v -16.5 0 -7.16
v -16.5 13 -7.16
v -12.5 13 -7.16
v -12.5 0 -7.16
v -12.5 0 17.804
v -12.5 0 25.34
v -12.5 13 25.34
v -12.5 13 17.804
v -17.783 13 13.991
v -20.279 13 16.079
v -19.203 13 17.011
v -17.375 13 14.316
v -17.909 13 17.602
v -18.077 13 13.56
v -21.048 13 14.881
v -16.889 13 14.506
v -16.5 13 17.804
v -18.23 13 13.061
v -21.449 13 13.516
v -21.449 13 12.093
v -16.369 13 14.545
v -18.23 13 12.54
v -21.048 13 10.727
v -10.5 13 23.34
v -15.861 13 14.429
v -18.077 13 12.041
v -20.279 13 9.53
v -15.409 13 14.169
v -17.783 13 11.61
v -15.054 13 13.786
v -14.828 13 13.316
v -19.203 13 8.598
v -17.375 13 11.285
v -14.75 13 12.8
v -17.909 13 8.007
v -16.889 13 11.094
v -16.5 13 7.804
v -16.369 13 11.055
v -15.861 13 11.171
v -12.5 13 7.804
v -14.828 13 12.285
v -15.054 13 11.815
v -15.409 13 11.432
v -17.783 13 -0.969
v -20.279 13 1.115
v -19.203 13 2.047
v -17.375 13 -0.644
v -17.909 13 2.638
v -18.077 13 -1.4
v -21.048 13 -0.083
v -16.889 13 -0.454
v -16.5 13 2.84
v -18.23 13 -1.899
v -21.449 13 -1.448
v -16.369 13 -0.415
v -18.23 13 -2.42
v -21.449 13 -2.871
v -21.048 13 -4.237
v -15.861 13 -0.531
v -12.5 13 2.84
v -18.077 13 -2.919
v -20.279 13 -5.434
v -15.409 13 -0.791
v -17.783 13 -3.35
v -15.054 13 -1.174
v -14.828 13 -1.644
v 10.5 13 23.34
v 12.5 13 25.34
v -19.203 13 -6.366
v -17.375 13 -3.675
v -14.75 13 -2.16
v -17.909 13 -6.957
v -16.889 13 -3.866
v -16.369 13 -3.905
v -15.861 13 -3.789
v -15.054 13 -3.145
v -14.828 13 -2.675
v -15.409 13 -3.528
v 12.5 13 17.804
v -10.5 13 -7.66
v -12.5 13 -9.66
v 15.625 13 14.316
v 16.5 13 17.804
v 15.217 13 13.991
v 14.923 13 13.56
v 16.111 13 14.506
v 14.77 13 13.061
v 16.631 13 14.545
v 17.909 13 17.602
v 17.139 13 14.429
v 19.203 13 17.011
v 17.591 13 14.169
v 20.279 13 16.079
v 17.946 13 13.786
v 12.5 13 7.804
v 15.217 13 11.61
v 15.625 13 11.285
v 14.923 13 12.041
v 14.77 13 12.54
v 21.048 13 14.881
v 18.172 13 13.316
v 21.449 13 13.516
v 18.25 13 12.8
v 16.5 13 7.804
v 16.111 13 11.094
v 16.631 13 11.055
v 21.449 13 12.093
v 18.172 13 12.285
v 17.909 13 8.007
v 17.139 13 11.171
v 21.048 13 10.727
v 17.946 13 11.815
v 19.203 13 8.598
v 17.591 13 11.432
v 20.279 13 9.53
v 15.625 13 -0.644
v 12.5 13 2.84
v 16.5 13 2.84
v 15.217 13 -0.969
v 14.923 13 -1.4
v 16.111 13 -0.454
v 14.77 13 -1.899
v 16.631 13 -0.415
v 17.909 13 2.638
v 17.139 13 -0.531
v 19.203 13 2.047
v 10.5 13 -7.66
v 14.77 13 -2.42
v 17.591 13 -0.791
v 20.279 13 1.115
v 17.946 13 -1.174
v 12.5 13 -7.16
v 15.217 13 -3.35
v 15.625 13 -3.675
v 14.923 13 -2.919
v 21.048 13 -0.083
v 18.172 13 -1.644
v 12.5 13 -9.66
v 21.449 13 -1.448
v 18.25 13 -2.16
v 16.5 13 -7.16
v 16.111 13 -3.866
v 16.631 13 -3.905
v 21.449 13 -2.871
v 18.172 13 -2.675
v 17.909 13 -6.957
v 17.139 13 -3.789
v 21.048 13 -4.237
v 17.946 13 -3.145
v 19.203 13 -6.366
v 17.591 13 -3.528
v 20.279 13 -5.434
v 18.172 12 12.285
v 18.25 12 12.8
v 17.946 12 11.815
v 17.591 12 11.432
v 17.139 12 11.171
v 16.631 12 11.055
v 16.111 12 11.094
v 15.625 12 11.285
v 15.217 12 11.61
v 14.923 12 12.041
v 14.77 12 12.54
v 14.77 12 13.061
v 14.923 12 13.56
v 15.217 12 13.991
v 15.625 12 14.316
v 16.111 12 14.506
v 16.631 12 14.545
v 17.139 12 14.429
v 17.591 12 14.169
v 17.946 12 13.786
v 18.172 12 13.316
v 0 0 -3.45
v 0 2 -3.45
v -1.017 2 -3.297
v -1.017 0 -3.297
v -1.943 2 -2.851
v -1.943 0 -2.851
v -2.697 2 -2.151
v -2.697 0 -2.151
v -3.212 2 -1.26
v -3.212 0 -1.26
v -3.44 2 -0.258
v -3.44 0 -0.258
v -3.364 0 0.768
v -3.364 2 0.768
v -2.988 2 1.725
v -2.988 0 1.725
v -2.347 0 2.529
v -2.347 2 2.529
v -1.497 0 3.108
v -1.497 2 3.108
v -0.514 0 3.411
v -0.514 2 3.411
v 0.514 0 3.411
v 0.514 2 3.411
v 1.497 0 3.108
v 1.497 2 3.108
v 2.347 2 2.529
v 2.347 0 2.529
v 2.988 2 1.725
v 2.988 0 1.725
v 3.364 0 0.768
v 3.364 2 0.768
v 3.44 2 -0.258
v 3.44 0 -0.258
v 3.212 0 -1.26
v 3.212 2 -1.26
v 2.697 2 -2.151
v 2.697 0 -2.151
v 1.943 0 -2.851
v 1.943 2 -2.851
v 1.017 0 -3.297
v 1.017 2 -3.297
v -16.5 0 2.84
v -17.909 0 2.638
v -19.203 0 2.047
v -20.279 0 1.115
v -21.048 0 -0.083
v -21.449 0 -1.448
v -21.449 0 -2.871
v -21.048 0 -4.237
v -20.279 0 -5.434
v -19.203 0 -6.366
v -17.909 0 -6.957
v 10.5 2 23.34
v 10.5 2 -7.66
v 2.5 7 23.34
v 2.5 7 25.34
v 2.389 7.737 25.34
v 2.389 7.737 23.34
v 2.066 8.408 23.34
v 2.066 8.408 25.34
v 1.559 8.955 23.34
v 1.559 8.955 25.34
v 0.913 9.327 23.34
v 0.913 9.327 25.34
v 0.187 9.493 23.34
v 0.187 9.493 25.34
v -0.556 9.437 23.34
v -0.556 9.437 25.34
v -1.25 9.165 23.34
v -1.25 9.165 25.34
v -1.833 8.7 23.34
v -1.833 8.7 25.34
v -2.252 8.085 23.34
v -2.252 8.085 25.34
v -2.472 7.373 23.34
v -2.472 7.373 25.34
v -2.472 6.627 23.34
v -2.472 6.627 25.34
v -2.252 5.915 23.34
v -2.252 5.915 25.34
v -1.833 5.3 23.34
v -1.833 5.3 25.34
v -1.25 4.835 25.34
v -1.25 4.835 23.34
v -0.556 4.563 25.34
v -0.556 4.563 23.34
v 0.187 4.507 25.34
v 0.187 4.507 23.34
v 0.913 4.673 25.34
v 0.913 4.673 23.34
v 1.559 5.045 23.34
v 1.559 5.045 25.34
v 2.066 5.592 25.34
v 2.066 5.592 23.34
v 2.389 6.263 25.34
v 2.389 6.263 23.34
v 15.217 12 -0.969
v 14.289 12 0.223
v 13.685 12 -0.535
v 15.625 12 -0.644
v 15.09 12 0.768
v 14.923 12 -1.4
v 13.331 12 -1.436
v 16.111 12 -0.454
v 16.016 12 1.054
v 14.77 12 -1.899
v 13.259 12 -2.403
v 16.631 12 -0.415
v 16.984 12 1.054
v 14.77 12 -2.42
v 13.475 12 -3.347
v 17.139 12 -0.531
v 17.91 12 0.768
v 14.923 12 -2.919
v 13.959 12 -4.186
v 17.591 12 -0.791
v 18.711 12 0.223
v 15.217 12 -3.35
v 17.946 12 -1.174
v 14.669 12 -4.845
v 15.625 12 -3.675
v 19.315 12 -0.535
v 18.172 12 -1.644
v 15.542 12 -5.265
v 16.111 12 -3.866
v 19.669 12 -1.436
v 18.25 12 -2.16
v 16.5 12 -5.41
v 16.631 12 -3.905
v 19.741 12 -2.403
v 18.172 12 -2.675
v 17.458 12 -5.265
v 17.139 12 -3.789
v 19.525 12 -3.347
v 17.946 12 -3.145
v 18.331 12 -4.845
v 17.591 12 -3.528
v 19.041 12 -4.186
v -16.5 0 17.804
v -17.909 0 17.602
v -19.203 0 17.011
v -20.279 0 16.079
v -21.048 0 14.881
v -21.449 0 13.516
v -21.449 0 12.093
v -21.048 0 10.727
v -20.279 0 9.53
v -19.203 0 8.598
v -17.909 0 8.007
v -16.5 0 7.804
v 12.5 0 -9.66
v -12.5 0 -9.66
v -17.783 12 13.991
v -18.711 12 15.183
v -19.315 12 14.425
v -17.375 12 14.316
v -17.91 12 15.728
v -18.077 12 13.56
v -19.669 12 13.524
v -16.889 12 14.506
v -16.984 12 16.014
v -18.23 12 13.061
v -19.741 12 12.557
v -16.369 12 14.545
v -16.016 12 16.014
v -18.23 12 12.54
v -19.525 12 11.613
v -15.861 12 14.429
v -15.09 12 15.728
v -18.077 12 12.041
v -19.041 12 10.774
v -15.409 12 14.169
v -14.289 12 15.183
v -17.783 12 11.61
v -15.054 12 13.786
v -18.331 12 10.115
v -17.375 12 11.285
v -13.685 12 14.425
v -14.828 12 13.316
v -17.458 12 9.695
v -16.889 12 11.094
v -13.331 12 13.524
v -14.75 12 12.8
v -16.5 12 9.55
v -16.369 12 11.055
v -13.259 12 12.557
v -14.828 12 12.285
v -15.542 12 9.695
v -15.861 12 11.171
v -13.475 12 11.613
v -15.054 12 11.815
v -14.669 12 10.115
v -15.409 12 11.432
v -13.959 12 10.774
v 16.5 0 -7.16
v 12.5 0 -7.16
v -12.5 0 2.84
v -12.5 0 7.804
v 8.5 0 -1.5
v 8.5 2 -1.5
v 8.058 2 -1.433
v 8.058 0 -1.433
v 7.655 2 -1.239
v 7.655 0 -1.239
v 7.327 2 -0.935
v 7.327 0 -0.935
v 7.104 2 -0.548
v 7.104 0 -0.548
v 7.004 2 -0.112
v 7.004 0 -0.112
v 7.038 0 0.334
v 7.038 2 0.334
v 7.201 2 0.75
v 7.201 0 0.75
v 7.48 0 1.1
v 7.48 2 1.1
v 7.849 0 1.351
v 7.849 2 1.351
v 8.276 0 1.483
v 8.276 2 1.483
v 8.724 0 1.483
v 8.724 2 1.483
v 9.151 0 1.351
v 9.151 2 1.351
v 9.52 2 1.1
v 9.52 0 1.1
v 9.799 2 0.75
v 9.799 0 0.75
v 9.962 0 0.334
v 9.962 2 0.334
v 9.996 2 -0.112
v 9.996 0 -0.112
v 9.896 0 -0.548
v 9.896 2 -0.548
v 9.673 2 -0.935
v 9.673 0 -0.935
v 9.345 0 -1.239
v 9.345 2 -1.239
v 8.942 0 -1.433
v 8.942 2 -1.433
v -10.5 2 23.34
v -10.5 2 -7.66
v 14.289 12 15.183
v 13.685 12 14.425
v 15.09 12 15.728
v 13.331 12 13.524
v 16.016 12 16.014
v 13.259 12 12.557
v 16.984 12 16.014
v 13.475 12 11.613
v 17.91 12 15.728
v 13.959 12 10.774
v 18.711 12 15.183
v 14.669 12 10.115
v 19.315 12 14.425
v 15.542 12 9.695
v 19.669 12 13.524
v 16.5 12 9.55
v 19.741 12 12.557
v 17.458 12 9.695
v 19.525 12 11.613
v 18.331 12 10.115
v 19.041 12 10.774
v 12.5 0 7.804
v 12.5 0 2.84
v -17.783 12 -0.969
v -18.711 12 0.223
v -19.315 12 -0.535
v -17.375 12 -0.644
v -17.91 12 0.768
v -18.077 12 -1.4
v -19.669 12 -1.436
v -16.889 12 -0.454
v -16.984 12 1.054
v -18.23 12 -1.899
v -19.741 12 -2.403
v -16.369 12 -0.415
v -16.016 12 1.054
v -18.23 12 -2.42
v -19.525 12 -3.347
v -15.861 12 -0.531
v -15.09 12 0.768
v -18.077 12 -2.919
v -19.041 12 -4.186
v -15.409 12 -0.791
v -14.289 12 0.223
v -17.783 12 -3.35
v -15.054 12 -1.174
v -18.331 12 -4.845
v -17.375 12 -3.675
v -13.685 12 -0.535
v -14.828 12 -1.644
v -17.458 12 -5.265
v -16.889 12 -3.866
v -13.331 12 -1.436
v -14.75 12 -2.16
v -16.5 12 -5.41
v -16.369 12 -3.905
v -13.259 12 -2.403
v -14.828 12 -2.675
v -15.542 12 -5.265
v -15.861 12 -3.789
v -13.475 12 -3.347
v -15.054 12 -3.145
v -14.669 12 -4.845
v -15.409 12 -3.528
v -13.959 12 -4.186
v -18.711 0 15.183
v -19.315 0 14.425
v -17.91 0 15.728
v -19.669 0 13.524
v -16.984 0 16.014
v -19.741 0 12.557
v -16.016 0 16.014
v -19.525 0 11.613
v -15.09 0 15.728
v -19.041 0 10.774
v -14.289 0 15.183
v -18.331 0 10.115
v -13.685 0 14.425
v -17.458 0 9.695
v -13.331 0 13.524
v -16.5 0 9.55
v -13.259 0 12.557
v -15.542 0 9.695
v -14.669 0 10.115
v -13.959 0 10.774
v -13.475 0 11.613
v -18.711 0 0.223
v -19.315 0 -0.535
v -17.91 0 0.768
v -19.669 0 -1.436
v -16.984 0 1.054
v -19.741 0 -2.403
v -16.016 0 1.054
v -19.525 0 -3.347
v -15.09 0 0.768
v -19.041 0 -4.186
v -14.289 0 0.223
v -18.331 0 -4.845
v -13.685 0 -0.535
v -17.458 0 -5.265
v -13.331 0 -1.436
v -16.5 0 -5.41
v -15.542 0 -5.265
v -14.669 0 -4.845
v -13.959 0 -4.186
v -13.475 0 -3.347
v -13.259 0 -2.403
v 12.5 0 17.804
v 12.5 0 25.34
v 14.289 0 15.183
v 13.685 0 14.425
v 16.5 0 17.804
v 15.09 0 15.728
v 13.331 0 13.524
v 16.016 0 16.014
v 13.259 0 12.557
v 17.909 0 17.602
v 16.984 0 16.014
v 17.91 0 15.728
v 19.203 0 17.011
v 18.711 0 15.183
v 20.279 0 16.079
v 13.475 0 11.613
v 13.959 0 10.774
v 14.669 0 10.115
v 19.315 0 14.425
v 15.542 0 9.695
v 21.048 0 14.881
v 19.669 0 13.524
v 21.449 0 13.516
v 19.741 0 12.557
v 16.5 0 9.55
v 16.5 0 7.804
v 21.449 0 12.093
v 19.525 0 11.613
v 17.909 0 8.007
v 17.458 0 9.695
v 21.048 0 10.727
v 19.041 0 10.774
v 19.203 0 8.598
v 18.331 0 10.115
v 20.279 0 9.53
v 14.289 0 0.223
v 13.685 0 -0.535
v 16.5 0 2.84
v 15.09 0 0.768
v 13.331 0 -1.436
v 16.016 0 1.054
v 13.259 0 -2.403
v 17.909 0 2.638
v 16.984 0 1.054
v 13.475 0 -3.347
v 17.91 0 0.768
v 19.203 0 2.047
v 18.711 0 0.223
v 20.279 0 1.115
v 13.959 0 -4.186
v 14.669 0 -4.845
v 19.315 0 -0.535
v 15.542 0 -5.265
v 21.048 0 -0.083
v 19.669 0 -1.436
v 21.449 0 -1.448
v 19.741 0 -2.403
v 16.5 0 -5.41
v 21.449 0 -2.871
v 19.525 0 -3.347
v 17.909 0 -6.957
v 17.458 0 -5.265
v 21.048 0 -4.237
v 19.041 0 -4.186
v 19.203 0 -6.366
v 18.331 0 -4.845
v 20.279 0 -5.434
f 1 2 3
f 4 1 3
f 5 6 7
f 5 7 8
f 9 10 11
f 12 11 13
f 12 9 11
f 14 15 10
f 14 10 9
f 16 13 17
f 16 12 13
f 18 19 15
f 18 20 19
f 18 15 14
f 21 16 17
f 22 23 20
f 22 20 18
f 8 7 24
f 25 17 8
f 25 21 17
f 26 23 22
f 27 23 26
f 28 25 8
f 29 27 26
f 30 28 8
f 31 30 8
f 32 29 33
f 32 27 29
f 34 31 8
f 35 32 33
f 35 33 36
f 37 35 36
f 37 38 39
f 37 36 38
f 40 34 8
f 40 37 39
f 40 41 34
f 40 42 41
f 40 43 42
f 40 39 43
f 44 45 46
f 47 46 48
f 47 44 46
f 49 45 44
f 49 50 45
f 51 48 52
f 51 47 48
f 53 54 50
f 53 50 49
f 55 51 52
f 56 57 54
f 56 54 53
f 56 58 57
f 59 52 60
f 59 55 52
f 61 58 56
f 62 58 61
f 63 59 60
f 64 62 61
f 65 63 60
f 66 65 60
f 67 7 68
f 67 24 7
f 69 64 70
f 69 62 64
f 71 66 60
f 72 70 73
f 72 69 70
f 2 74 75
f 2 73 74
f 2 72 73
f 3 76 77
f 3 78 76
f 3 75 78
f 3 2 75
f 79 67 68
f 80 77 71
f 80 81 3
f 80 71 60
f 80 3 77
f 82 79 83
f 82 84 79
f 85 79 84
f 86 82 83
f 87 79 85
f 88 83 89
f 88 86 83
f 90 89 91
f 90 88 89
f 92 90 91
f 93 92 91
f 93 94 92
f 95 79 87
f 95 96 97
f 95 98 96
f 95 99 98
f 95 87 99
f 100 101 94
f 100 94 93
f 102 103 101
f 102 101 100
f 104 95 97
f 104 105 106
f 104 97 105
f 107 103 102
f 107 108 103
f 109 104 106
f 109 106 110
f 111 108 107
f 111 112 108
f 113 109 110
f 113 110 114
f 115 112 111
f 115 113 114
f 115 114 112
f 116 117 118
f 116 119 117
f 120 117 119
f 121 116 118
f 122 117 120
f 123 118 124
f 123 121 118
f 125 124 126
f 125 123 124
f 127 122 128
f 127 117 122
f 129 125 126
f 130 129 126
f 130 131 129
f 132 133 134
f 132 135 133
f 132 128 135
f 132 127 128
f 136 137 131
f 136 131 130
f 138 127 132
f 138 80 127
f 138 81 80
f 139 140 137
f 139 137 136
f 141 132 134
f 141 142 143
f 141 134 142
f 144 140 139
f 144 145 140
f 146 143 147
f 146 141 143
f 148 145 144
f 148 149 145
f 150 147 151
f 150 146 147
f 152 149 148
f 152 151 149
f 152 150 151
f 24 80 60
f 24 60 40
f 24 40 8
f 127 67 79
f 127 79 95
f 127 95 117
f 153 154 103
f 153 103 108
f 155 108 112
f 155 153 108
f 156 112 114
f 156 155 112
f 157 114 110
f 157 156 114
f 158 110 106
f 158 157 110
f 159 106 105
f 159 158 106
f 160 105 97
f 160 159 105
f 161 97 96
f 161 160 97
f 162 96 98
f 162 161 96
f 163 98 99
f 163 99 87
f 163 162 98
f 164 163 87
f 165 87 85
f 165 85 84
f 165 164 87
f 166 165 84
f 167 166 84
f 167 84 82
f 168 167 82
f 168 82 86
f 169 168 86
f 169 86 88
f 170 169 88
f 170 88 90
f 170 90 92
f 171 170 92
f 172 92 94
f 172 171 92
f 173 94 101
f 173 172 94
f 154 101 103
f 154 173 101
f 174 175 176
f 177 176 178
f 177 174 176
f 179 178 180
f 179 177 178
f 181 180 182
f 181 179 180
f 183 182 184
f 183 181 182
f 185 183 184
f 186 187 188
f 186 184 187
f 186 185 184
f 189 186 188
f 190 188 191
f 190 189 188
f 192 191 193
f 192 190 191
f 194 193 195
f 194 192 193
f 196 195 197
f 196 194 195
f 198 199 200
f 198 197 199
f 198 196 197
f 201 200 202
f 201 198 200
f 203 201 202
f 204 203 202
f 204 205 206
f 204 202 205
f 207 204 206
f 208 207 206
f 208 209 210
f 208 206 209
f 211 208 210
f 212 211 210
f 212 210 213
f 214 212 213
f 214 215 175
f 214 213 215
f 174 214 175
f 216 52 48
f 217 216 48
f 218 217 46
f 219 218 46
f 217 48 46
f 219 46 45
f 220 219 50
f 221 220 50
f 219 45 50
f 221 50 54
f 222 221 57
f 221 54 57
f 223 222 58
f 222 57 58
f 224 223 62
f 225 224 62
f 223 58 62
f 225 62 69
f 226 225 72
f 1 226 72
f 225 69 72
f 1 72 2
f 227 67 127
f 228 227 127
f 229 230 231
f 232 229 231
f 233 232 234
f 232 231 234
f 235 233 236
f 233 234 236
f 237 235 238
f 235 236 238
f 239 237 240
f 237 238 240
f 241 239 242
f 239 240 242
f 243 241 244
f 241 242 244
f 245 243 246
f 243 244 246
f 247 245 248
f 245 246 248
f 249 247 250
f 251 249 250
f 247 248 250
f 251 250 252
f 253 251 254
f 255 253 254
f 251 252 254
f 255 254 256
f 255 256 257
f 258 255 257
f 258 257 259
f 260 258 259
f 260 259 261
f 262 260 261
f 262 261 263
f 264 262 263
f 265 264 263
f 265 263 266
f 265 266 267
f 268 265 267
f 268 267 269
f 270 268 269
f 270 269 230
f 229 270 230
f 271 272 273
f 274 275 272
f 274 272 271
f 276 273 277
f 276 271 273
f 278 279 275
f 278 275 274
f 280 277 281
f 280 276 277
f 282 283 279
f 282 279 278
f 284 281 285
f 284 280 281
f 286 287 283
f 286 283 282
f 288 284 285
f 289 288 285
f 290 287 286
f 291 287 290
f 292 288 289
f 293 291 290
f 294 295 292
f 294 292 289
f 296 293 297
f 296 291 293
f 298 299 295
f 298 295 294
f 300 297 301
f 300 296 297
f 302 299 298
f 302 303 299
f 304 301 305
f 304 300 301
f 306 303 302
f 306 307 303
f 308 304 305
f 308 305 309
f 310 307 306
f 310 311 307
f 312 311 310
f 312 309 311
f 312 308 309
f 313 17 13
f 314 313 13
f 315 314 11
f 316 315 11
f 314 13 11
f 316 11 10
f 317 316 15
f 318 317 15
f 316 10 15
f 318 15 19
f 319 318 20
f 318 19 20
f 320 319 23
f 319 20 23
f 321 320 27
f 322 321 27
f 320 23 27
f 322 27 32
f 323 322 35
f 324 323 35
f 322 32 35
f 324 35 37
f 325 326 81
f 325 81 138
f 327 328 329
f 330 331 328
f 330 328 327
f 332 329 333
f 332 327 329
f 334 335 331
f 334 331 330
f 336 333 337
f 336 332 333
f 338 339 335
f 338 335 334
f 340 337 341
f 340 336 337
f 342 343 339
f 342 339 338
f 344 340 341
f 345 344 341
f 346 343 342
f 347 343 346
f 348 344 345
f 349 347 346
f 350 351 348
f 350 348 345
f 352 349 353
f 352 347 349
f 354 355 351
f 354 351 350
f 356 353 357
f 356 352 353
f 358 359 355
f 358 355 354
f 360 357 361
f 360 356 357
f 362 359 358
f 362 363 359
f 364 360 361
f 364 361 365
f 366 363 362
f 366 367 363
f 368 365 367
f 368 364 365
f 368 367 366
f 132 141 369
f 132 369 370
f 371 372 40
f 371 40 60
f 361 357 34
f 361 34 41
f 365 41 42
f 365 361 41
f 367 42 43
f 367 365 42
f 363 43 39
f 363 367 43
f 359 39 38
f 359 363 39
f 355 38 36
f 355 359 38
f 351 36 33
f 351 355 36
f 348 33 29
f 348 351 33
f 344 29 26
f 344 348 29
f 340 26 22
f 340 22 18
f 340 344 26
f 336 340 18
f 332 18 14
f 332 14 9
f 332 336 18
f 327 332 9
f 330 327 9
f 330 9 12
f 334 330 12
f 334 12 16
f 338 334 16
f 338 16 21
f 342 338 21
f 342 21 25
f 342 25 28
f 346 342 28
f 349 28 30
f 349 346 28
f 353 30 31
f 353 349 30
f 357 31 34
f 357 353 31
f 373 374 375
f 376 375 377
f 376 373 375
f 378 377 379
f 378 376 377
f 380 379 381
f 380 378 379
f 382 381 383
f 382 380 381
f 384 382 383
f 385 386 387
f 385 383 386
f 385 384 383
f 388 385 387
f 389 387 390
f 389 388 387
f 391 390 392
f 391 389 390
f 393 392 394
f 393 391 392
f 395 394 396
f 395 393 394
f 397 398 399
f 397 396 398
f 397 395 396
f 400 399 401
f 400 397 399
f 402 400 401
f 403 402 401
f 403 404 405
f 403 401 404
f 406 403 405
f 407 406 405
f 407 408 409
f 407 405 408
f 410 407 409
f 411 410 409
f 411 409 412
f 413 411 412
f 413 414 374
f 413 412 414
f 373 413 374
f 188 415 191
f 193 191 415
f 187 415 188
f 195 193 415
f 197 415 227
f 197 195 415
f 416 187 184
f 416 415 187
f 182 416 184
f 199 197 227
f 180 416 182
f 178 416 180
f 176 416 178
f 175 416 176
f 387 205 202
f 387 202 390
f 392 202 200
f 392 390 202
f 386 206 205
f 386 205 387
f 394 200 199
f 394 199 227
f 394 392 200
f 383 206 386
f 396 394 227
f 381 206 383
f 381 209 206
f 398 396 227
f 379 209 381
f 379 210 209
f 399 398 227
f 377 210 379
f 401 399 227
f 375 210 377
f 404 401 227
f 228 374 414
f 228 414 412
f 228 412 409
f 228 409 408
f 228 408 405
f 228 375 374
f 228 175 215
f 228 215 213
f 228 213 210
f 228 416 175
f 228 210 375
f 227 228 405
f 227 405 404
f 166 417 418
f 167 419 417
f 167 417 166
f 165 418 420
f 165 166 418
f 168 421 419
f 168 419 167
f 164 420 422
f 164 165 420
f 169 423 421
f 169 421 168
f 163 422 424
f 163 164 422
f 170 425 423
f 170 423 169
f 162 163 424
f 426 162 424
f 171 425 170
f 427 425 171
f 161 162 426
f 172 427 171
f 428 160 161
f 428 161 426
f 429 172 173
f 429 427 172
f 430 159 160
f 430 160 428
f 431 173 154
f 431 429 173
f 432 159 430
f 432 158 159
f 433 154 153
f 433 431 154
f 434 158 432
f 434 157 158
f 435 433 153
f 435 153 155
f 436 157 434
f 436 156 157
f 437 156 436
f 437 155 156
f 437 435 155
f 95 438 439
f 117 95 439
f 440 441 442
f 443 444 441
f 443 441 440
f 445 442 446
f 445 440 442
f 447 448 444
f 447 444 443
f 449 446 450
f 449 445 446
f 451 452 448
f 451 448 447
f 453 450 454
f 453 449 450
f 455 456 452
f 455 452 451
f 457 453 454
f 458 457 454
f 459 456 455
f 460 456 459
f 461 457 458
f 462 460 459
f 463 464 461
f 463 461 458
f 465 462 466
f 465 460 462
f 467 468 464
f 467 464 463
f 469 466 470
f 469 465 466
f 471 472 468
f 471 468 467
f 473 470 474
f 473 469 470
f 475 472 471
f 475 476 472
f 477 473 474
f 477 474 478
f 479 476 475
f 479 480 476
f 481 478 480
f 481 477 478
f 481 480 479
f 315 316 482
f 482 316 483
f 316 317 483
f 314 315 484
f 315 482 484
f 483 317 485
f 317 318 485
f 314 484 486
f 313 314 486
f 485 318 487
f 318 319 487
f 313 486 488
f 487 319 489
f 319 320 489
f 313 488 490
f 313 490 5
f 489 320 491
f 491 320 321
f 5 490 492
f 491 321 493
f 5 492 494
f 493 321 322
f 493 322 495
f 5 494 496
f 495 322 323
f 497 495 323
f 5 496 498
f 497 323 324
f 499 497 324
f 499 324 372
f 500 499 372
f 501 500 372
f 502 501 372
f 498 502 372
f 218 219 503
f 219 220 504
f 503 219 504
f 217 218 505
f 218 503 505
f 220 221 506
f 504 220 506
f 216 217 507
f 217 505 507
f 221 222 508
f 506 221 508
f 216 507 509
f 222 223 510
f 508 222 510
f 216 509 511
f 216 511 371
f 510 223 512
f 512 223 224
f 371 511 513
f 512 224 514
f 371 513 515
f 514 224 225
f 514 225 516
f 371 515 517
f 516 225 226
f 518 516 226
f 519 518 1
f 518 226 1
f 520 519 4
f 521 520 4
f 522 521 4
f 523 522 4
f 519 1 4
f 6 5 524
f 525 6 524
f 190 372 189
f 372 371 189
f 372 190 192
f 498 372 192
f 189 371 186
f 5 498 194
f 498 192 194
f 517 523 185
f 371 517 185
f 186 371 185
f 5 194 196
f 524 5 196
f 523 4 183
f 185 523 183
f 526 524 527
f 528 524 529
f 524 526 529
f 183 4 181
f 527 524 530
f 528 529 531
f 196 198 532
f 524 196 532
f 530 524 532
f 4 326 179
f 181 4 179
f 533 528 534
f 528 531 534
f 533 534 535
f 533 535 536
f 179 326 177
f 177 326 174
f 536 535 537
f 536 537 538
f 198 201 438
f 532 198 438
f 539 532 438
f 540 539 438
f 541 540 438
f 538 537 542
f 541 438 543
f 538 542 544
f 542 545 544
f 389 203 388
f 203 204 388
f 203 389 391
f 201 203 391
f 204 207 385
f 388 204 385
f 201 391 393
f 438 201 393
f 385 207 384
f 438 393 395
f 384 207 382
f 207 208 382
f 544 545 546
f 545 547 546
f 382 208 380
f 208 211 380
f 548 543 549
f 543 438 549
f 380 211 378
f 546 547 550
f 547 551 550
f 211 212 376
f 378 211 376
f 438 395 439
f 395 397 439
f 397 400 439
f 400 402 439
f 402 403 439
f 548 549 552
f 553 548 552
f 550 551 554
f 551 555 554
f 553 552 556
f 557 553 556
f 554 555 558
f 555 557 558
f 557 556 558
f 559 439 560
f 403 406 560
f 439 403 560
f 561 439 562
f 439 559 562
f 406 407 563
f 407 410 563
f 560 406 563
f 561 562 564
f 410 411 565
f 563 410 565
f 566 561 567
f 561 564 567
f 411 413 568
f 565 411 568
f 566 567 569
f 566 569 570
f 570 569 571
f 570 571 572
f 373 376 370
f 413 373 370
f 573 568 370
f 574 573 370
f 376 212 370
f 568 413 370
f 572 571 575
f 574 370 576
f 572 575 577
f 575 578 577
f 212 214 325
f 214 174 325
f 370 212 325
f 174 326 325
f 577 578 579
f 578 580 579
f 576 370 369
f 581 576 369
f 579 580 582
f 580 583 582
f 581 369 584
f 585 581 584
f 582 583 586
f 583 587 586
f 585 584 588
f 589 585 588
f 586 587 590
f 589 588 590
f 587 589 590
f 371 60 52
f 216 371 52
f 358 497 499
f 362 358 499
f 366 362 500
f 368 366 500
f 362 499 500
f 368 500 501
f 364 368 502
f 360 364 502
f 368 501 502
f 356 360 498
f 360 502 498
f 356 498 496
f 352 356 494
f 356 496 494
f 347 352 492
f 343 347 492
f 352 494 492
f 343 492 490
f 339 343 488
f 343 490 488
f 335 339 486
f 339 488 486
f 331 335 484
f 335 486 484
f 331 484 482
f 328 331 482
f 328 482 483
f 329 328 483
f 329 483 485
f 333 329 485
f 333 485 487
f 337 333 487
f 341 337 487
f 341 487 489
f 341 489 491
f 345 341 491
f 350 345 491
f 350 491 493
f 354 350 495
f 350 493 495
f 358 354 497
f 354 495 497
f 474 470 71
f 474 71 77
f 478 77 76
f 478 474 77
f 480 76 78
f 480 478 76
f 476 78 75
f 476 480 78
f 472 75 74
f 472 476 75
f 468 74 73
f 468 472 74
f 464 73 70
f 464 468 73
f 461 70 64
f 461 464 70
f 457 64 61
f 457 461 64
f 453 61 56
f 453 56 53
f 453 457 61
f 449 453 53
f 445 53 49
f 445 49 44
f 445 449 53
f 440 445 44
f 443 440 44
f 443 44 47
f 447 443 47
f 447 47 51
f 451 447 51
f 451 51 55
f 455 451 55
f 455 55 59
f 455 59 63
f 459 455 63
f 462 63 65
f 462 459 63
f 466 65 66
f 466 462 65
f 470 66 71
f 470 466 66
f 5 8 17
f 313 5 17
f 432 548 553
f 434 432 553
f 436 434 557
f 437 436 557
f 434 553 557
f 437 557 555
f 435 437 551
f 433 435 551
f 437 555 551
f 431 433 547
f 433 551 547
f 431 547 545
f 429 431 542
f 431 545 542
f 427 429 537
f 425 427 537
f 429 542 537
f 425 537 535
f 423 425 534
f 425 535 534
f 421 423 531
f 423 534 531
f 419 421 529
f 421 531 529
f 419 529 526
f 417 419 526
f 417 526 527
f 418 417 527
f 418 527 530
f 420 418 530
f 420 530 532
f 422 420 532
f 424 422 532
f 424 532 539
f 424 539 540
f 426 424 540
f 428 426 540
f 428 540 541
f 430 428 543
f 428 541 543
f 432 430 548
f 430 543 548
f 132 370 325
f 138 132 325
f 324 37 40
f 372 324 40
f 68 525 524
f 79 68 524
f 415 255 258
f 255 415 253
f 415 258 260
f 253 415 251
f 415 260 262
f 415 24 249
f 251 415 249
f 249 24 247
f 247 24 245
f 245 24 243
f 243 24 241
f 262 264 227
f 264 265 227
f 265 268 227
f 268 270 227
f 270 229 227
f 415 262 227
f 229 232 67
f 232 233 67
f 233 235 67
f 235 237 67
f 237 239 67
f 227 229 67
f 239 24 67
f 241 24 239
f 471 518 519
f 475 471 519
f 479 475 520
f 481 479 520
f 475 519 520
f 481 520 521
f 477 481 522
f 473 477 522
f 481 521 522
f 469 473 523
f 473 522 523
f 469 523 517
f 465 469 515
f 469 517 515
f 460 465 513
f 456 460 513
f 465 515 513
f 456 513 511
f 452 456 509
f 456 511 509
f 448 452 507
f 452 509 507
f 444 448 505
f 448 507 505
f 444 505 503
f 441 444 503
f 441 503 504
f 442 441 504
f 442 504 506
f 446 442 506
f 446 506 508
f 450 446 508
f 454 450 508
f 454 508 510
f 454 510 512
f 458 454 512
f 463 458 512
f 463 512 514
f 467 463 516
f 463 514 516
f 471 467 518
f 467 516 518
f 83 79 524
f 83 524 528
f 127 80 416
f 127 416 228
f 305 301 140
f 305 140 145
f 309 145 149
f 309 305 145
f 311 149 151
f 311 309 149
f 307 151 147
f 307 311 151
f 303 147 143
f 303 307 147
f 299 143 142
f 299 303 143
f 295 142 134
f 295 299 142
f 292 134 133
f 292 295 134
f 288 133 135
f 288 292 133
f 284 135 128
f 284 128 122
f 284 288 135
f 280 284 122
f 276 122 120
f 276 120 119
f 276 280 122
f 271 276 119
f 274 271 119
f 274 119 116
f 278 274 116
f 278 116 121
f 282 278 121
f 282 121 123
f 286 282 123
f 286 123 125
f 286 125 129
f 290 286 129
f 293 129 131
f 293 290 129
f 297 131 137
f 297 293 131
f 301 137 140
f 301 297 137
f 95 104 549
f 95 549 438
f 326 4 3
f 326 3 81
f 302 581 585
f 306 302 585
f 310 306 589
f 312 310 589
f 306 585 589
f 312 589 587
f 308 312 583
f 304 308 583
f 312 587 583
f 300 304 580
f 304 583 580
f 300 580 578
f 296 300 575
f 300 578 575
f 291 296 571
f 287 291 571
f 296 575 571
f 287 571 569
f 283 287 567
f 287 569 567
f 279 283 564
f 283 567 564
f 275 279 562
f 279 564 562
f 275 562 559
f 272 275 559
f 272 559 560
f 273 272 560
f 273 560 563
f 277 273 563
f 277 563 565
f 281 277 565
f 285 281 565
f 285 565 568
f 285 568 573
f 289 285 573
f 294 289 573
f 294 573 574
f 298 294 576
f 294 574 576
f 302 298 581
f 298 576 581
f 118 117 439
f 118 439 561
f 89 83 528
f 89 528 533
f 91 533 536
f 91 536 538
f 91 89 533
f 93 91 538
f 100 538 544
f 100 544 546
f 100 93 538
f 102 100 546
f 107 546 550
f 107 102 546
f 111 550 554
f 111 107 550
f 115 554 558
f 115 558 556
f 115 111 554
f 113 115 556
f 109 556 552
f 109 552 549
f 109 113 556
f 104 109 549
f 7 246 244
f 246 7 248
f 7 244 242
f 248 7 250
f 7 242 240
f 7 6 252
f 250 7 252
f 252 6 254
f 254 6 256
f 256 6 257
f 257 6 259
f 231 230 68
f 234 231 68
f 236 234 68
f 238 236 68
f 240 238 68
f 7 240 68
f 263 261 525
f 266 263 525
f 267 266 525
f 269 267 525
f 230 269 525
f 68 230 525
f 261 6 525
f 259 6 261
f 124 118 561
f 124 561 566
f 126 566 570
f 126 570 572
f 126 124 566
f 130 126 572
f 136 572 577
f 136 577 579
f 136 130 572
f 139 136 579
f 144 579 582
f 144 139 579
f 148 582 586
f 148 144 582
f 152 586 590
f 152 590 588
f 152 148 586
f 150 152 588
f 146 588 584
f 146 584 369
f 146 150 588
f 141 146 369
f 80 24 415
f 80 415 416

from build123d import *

# Parameters (mm, degrees)
SKETCH1_W              = 25
SKETCH1_H              = 35
SKETCH1_R              = 3.45
SKETCH1_R_2            = 1.5
BOSS_EXTRUDE1_DEPTH    = 13
SKETCH5_W              = 21
SKETCH5_H              = 31
CUT_EXTRUDE1_DEPTH     = 11
CUT_EXTRUDE2_REACH     = 41.373
SKETCH7_R              = 2.5
BOSS_EXTRUDE3_DEPTH    = 13
SKETCH11_R             = 3.25
CUT_EXTRUDE4_DEPTH     = 12
CUT_EXTRUDE5_START     = 12
CUT_EXTRUDE5_OUTLINE_R = 1.75
CUT_EXTRUDE5_DEPTH     = 1


# Read off the part's stored shape, not the designer's step: Cut-Extrude5
with BuildPart() as part:
    # Sketch1 → Boss-Extrude1 (new body)
    with BuildSketch(Plane(origin=(0, 0, 0), x_dir=(1, 0, 0), z_dir=(0, 1, 0))):
        with Locations((0, -7.840328725)):
            Rectangle(SKETCH1_W, SKETCH1_H)
        with Locations(Location((0, 0, 0), (0, 0, 90))):
            Circle(SKETCH1_R, mode=Mode.SUBTRACT)
        with Locations(Location((8.5, 0, 0), (0, 0, 90))):
            Circle(SKETCH1_R_2, mode=Mode.SUBTRACT)
    extrude(amount=BOSS_EXTRUDE1_DEPTH)

    # Sketch5 → Cut-Extrude1 (cut)
    with BuildSketch(Plane(origin=(0, 13, 0), x_dir=(1, 0, 0), z_dir=(0, 1, 0))):
        with Locations((0, -7.840328725)):
            Rectangle(SKETCH5_W, SKETCH5_H)
    extrude(amount=-CUT_EXTRUDE1_DEPTH, mode=Mode.SUBTRACT)

    # Sketch7 → Cut-Extrude2 (cut, up to next)
    with BuildSketch(Plane.XY.offset(25.340328725), mode=Mode.PRIVATE) as cut_extrude2_sk1:
        with Locations((0, 7)):
            Circle(SKETCH7_R)
    cut_extrude2_tool1 = extrude(cut_extrude2_sk1.sketch, amount=-CUT_EXTRUDE2_REACH, mode=Mode.PRIVATE) & part.part
    add(cut_extrude2_tool1.solids().sort_by_distance((0, 7, 25.340329))[0], mode=Mode.SUBTRACT)

    # Sketch9 → Boss-Extrude3 (add, through all)
    with BuildSketch(Plane(origin=(0, 13, 0), x_dir=(1, 0, 0), z_dir=(0, 1, 0))):
        with BuildLine():
            Line((-16.5, 7.159671275), (-12.5, 7.159671275))
            Line((-12.5, 7.159671275), (-12.5, -2.840328725))
            Line((-12.5, -2.840328725), (-16.5, -2.840328725))
            ThreePointArc((-16.5, -2.840328725), (-21.5, 2.159671275), (-16.5, 7.159671275))
        make_face()
        with BuildLine():
            Line((-16.5, -7.804369497), (-12.5, -7.804369497))
            Line((-12.5, -7.804369497), (-12.5, -17.804369497))
            Line((-12.5, -17.804369497), (-16.5, -17.804369497))
            ThreePointArc((-16.5, -17.804369497), (-21.5, -12.804369497), (-16.5, -7.804369497))
        make_face()
        with BuildLine():
            Line((12.5, -7.804369497), (12.5, -17.804369497))
            Line((12.5, -17.804369497), (16.5, -17.804369497))
            ThreePointArc((16.5, -17.804369497), (21.5, -12.804369497), (16.5, -7.804369497))
            Line((16.5, -7.804369497), (12.5, -7.804369497))
        make_face()
        with BuildLine():
            Line((12.5, 7.159671275), (12.5, -2.840328725))
            Line((12.5, -2.840328725), (16.5, -2.840328725))
            ThreePointArc((16.5, -2.840328725), (21.5, 2.159671275), (16.5, 7.159671275))
            Line((16.5, 7.159671275), (12.5, 7.159671275))
        make_face()
    extrude(amount=-BOSS_EXTRUDE3_DEPTH)

    # Sketch11 → Cut-Extrude4 (cut)
    with BuildSketch(Plane.XZ):
        with Locations(Location((-16.5, 12.800328725, 0), (0, 0, 270))):
            Circle(SKETCH11_R)
        with Locations(Location((-16.5, -2.159671275, 0), (0, 0, 270))):
            Circle(SKETCH11_R)
        with Locations(Location((16.5, 12.800328725, 0), (0, 0, 270))):
            Circle(SKETCH11_R)
        with Locations(Location((16.5, -2.159671275, 0), (0, 0, 270))):
            Circle(SKETCH11_R)
    extrude(amount=-CUT_EXTRUDE4_DEPTH, mode=Mode.SUBTRACT)

    # Cut-Extrude5 outline → Cut-Extrude5 (cut)
    with BuildSketch(Plane(origin=(0, 0, 0), x_dir=(1, 0, 0), z_dir=(0, 1, 0)).offset(CUT_EXTRUDE5_START)):
        with Locations((-16.5, 2.159671275)):
            Circle(CUT_EXTRUDE5_OUTLINE_R)
        with Locations((16.5, -12.800328725)):
            Circle(CUT_EXTRUDE5_OUTLINE_R)
        with Locations((16.5, 2.159671275)):
            Circle(CUT_EXTRUDE5_OUTLINE_R)
        with Locations((-16.5, -12.800328725)):
            Circle(CUT_EXTRUDE5_OUTLINE_R)
    extrude(amount=CUT_EXTRUDE5_DEPTH, mode=Mode.SUBTRACT)


solid = part.part
